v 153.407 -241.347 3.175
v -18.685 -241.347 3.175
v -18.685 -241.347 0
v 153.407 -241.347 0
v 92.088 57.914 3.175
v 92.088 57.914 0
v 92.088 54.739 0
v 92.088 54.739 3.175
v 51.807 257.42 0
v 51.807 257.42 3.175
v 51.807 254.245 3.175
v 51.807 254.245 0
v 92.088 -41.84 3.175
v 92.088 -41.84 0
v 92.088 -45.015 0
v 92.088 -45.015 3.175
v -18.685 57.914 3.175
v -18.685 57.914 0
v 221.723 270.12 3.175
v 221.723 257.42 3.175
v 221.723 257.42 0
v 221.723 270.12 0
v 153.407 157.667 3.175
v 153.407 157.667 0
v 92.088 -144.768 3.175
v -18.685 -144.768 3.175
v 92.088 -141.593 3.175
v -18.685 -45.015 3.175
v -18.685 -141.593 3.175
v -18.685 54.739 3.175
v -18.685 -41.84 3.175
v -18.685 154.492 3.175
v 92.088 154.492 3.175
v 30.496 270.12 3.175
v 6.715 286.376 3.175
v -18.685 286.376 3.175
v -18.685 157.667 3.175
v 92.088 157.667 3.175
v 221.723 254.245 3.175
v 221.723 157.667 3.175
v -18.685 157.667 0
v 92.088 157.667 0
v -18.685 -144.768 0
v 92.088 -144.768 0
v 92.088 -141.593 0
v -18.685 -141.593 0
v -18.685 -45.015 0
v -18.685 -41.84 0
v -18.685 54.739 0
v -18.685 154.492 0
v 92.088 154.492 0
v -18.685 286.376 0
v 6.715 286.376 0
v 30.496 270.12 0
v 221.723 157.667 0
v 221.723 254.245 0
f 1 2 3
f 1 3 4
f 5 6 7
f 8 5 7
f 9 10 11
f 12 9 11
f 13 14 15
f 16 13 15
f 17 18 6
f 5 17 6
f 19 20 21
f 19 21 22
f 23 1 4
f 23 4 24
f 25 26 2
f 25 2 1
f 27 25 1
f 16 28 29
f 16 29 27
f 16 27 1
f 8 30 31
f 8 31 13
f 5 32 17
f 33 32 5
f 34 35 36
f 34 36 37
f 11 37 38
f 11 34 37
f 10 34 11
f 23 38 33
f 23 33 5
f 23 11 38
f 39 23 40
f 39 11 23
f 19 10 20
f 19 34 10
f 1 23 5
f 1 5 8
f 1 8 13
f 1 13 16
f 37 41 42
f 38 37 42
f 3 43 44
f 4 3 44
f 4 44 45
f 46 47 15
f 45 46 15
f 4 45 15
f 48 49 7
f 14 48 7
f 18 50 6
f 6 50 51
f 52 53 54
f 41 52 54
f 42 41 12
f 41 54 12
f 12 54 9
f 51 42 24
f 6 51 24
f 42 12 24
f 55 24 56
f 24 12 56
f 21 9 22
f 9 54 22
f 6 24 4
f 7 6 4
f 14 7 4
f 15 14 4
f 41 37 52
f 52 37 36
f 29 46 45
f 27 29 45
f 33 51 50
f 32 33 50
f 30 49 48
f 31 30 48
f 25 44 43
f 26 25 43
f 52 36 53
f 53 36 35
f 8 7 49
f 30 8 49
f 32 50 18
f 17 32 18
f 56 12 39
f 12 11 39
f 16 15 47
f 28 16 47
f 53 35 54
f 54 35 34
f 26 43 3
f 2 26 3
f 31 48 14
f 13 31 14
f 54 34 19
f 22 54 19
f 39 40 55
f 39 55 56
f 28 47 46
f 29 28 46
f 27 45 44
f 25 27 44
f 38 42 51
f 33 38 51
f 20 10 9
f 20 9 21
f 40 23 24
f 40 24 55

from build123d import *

# Parameters (mm, degrees)
BOSS_EXTRUDE2_DEPTH = 3.175
SKETCH2_W           = 24.39416
SKETCH2_H           = 495.5921
BOSS_EXTRUDE3_DEPTH = 3.175
BOSS_EXTRUDE4_DEPTH = 3.175
SKETCH4_W           = 68.31584
SKETCH4_H           = 12.7
SKETCH4_H_2         = 96.57842
BOSS_EXTRUDE5_DEPTH = 3.175


with BuildPart() as part:
    # Sketch1 → Boss-Extrude2 (new body)
    with BuildSketch(Plane.XY):
        Polygon((129.013076168, 254.245404572), (-18.685383832, 254.245404572), (-18.685383832, 157.666984572), (92.088461168, 157.666984572), (92.088461168, 154.491984572), (-18.685383832, 154.491984572), (-18.685383832, 57.913564572), (92.088461168, 57.913564572), (92.088461168, 54.738564572), (-18.685383832, 54.738564572), (-18.685383832, -41.839855428), (92.088461168, -41.839855428), (92.088461168, -45.014855428), (-18.685383832, -45.014855428), (-18.685383832, -141.593275428), (92.088461168, -141.593275428), (92.088461168, -144.768275428), (-18.685383832, -144.768275428), (-18.685383832, -241.346695428), (129.013076168, -241.346695428), align=None)
    extrude(amount=BOSS_EXTRUDE2_DEPTH)

    # Sketch2 → Boss-Extrude3 (add, through all)
    with BuildSketch(Plane.XY.offset(3.175)):
        with Locations((141.210156168, 6.449354572)):
            Rectangle(SKETCH2_W, SKETCH2_H)
    extrude(amount=-BOSS_EXTRUDE3_DEPTH)

    # Sketch3 → Boss-Extrude4 (add, through all)
    with BuildSketch(Plane.XY.offset(3.175)):
        Polygon((51.807236168, 257.420404572), (51.807236168, 254.245404572), (-18.685383832, 254.245404572), (-18.685383832, 286.376404572), (6.714616168, 286.376404572), (30.496305109, 270.120404572), (153.407236168, 270.120404572), (153.407236168, 257.420404572), align=None)
    extrude(amount=-BOSS_EXTRUDE4_DEPTH)

    # Sketch4 → Boss-Extrude5 (add, through all)
    with BuildSketch(Plane.XY.offset(3.175)):
        with Locations((187.565156168, 263.770404572)):
            Rectangle(SKETCH4_W, SKETCH4_H)
        with Locations((187.565156168, 205.956194572)):
            Rectangle(SKETCH4_W, SKETCH4_H_2)
    extrude(amount=-BOSS_EXTRUDE5_DEPTH)


solid = part.part
